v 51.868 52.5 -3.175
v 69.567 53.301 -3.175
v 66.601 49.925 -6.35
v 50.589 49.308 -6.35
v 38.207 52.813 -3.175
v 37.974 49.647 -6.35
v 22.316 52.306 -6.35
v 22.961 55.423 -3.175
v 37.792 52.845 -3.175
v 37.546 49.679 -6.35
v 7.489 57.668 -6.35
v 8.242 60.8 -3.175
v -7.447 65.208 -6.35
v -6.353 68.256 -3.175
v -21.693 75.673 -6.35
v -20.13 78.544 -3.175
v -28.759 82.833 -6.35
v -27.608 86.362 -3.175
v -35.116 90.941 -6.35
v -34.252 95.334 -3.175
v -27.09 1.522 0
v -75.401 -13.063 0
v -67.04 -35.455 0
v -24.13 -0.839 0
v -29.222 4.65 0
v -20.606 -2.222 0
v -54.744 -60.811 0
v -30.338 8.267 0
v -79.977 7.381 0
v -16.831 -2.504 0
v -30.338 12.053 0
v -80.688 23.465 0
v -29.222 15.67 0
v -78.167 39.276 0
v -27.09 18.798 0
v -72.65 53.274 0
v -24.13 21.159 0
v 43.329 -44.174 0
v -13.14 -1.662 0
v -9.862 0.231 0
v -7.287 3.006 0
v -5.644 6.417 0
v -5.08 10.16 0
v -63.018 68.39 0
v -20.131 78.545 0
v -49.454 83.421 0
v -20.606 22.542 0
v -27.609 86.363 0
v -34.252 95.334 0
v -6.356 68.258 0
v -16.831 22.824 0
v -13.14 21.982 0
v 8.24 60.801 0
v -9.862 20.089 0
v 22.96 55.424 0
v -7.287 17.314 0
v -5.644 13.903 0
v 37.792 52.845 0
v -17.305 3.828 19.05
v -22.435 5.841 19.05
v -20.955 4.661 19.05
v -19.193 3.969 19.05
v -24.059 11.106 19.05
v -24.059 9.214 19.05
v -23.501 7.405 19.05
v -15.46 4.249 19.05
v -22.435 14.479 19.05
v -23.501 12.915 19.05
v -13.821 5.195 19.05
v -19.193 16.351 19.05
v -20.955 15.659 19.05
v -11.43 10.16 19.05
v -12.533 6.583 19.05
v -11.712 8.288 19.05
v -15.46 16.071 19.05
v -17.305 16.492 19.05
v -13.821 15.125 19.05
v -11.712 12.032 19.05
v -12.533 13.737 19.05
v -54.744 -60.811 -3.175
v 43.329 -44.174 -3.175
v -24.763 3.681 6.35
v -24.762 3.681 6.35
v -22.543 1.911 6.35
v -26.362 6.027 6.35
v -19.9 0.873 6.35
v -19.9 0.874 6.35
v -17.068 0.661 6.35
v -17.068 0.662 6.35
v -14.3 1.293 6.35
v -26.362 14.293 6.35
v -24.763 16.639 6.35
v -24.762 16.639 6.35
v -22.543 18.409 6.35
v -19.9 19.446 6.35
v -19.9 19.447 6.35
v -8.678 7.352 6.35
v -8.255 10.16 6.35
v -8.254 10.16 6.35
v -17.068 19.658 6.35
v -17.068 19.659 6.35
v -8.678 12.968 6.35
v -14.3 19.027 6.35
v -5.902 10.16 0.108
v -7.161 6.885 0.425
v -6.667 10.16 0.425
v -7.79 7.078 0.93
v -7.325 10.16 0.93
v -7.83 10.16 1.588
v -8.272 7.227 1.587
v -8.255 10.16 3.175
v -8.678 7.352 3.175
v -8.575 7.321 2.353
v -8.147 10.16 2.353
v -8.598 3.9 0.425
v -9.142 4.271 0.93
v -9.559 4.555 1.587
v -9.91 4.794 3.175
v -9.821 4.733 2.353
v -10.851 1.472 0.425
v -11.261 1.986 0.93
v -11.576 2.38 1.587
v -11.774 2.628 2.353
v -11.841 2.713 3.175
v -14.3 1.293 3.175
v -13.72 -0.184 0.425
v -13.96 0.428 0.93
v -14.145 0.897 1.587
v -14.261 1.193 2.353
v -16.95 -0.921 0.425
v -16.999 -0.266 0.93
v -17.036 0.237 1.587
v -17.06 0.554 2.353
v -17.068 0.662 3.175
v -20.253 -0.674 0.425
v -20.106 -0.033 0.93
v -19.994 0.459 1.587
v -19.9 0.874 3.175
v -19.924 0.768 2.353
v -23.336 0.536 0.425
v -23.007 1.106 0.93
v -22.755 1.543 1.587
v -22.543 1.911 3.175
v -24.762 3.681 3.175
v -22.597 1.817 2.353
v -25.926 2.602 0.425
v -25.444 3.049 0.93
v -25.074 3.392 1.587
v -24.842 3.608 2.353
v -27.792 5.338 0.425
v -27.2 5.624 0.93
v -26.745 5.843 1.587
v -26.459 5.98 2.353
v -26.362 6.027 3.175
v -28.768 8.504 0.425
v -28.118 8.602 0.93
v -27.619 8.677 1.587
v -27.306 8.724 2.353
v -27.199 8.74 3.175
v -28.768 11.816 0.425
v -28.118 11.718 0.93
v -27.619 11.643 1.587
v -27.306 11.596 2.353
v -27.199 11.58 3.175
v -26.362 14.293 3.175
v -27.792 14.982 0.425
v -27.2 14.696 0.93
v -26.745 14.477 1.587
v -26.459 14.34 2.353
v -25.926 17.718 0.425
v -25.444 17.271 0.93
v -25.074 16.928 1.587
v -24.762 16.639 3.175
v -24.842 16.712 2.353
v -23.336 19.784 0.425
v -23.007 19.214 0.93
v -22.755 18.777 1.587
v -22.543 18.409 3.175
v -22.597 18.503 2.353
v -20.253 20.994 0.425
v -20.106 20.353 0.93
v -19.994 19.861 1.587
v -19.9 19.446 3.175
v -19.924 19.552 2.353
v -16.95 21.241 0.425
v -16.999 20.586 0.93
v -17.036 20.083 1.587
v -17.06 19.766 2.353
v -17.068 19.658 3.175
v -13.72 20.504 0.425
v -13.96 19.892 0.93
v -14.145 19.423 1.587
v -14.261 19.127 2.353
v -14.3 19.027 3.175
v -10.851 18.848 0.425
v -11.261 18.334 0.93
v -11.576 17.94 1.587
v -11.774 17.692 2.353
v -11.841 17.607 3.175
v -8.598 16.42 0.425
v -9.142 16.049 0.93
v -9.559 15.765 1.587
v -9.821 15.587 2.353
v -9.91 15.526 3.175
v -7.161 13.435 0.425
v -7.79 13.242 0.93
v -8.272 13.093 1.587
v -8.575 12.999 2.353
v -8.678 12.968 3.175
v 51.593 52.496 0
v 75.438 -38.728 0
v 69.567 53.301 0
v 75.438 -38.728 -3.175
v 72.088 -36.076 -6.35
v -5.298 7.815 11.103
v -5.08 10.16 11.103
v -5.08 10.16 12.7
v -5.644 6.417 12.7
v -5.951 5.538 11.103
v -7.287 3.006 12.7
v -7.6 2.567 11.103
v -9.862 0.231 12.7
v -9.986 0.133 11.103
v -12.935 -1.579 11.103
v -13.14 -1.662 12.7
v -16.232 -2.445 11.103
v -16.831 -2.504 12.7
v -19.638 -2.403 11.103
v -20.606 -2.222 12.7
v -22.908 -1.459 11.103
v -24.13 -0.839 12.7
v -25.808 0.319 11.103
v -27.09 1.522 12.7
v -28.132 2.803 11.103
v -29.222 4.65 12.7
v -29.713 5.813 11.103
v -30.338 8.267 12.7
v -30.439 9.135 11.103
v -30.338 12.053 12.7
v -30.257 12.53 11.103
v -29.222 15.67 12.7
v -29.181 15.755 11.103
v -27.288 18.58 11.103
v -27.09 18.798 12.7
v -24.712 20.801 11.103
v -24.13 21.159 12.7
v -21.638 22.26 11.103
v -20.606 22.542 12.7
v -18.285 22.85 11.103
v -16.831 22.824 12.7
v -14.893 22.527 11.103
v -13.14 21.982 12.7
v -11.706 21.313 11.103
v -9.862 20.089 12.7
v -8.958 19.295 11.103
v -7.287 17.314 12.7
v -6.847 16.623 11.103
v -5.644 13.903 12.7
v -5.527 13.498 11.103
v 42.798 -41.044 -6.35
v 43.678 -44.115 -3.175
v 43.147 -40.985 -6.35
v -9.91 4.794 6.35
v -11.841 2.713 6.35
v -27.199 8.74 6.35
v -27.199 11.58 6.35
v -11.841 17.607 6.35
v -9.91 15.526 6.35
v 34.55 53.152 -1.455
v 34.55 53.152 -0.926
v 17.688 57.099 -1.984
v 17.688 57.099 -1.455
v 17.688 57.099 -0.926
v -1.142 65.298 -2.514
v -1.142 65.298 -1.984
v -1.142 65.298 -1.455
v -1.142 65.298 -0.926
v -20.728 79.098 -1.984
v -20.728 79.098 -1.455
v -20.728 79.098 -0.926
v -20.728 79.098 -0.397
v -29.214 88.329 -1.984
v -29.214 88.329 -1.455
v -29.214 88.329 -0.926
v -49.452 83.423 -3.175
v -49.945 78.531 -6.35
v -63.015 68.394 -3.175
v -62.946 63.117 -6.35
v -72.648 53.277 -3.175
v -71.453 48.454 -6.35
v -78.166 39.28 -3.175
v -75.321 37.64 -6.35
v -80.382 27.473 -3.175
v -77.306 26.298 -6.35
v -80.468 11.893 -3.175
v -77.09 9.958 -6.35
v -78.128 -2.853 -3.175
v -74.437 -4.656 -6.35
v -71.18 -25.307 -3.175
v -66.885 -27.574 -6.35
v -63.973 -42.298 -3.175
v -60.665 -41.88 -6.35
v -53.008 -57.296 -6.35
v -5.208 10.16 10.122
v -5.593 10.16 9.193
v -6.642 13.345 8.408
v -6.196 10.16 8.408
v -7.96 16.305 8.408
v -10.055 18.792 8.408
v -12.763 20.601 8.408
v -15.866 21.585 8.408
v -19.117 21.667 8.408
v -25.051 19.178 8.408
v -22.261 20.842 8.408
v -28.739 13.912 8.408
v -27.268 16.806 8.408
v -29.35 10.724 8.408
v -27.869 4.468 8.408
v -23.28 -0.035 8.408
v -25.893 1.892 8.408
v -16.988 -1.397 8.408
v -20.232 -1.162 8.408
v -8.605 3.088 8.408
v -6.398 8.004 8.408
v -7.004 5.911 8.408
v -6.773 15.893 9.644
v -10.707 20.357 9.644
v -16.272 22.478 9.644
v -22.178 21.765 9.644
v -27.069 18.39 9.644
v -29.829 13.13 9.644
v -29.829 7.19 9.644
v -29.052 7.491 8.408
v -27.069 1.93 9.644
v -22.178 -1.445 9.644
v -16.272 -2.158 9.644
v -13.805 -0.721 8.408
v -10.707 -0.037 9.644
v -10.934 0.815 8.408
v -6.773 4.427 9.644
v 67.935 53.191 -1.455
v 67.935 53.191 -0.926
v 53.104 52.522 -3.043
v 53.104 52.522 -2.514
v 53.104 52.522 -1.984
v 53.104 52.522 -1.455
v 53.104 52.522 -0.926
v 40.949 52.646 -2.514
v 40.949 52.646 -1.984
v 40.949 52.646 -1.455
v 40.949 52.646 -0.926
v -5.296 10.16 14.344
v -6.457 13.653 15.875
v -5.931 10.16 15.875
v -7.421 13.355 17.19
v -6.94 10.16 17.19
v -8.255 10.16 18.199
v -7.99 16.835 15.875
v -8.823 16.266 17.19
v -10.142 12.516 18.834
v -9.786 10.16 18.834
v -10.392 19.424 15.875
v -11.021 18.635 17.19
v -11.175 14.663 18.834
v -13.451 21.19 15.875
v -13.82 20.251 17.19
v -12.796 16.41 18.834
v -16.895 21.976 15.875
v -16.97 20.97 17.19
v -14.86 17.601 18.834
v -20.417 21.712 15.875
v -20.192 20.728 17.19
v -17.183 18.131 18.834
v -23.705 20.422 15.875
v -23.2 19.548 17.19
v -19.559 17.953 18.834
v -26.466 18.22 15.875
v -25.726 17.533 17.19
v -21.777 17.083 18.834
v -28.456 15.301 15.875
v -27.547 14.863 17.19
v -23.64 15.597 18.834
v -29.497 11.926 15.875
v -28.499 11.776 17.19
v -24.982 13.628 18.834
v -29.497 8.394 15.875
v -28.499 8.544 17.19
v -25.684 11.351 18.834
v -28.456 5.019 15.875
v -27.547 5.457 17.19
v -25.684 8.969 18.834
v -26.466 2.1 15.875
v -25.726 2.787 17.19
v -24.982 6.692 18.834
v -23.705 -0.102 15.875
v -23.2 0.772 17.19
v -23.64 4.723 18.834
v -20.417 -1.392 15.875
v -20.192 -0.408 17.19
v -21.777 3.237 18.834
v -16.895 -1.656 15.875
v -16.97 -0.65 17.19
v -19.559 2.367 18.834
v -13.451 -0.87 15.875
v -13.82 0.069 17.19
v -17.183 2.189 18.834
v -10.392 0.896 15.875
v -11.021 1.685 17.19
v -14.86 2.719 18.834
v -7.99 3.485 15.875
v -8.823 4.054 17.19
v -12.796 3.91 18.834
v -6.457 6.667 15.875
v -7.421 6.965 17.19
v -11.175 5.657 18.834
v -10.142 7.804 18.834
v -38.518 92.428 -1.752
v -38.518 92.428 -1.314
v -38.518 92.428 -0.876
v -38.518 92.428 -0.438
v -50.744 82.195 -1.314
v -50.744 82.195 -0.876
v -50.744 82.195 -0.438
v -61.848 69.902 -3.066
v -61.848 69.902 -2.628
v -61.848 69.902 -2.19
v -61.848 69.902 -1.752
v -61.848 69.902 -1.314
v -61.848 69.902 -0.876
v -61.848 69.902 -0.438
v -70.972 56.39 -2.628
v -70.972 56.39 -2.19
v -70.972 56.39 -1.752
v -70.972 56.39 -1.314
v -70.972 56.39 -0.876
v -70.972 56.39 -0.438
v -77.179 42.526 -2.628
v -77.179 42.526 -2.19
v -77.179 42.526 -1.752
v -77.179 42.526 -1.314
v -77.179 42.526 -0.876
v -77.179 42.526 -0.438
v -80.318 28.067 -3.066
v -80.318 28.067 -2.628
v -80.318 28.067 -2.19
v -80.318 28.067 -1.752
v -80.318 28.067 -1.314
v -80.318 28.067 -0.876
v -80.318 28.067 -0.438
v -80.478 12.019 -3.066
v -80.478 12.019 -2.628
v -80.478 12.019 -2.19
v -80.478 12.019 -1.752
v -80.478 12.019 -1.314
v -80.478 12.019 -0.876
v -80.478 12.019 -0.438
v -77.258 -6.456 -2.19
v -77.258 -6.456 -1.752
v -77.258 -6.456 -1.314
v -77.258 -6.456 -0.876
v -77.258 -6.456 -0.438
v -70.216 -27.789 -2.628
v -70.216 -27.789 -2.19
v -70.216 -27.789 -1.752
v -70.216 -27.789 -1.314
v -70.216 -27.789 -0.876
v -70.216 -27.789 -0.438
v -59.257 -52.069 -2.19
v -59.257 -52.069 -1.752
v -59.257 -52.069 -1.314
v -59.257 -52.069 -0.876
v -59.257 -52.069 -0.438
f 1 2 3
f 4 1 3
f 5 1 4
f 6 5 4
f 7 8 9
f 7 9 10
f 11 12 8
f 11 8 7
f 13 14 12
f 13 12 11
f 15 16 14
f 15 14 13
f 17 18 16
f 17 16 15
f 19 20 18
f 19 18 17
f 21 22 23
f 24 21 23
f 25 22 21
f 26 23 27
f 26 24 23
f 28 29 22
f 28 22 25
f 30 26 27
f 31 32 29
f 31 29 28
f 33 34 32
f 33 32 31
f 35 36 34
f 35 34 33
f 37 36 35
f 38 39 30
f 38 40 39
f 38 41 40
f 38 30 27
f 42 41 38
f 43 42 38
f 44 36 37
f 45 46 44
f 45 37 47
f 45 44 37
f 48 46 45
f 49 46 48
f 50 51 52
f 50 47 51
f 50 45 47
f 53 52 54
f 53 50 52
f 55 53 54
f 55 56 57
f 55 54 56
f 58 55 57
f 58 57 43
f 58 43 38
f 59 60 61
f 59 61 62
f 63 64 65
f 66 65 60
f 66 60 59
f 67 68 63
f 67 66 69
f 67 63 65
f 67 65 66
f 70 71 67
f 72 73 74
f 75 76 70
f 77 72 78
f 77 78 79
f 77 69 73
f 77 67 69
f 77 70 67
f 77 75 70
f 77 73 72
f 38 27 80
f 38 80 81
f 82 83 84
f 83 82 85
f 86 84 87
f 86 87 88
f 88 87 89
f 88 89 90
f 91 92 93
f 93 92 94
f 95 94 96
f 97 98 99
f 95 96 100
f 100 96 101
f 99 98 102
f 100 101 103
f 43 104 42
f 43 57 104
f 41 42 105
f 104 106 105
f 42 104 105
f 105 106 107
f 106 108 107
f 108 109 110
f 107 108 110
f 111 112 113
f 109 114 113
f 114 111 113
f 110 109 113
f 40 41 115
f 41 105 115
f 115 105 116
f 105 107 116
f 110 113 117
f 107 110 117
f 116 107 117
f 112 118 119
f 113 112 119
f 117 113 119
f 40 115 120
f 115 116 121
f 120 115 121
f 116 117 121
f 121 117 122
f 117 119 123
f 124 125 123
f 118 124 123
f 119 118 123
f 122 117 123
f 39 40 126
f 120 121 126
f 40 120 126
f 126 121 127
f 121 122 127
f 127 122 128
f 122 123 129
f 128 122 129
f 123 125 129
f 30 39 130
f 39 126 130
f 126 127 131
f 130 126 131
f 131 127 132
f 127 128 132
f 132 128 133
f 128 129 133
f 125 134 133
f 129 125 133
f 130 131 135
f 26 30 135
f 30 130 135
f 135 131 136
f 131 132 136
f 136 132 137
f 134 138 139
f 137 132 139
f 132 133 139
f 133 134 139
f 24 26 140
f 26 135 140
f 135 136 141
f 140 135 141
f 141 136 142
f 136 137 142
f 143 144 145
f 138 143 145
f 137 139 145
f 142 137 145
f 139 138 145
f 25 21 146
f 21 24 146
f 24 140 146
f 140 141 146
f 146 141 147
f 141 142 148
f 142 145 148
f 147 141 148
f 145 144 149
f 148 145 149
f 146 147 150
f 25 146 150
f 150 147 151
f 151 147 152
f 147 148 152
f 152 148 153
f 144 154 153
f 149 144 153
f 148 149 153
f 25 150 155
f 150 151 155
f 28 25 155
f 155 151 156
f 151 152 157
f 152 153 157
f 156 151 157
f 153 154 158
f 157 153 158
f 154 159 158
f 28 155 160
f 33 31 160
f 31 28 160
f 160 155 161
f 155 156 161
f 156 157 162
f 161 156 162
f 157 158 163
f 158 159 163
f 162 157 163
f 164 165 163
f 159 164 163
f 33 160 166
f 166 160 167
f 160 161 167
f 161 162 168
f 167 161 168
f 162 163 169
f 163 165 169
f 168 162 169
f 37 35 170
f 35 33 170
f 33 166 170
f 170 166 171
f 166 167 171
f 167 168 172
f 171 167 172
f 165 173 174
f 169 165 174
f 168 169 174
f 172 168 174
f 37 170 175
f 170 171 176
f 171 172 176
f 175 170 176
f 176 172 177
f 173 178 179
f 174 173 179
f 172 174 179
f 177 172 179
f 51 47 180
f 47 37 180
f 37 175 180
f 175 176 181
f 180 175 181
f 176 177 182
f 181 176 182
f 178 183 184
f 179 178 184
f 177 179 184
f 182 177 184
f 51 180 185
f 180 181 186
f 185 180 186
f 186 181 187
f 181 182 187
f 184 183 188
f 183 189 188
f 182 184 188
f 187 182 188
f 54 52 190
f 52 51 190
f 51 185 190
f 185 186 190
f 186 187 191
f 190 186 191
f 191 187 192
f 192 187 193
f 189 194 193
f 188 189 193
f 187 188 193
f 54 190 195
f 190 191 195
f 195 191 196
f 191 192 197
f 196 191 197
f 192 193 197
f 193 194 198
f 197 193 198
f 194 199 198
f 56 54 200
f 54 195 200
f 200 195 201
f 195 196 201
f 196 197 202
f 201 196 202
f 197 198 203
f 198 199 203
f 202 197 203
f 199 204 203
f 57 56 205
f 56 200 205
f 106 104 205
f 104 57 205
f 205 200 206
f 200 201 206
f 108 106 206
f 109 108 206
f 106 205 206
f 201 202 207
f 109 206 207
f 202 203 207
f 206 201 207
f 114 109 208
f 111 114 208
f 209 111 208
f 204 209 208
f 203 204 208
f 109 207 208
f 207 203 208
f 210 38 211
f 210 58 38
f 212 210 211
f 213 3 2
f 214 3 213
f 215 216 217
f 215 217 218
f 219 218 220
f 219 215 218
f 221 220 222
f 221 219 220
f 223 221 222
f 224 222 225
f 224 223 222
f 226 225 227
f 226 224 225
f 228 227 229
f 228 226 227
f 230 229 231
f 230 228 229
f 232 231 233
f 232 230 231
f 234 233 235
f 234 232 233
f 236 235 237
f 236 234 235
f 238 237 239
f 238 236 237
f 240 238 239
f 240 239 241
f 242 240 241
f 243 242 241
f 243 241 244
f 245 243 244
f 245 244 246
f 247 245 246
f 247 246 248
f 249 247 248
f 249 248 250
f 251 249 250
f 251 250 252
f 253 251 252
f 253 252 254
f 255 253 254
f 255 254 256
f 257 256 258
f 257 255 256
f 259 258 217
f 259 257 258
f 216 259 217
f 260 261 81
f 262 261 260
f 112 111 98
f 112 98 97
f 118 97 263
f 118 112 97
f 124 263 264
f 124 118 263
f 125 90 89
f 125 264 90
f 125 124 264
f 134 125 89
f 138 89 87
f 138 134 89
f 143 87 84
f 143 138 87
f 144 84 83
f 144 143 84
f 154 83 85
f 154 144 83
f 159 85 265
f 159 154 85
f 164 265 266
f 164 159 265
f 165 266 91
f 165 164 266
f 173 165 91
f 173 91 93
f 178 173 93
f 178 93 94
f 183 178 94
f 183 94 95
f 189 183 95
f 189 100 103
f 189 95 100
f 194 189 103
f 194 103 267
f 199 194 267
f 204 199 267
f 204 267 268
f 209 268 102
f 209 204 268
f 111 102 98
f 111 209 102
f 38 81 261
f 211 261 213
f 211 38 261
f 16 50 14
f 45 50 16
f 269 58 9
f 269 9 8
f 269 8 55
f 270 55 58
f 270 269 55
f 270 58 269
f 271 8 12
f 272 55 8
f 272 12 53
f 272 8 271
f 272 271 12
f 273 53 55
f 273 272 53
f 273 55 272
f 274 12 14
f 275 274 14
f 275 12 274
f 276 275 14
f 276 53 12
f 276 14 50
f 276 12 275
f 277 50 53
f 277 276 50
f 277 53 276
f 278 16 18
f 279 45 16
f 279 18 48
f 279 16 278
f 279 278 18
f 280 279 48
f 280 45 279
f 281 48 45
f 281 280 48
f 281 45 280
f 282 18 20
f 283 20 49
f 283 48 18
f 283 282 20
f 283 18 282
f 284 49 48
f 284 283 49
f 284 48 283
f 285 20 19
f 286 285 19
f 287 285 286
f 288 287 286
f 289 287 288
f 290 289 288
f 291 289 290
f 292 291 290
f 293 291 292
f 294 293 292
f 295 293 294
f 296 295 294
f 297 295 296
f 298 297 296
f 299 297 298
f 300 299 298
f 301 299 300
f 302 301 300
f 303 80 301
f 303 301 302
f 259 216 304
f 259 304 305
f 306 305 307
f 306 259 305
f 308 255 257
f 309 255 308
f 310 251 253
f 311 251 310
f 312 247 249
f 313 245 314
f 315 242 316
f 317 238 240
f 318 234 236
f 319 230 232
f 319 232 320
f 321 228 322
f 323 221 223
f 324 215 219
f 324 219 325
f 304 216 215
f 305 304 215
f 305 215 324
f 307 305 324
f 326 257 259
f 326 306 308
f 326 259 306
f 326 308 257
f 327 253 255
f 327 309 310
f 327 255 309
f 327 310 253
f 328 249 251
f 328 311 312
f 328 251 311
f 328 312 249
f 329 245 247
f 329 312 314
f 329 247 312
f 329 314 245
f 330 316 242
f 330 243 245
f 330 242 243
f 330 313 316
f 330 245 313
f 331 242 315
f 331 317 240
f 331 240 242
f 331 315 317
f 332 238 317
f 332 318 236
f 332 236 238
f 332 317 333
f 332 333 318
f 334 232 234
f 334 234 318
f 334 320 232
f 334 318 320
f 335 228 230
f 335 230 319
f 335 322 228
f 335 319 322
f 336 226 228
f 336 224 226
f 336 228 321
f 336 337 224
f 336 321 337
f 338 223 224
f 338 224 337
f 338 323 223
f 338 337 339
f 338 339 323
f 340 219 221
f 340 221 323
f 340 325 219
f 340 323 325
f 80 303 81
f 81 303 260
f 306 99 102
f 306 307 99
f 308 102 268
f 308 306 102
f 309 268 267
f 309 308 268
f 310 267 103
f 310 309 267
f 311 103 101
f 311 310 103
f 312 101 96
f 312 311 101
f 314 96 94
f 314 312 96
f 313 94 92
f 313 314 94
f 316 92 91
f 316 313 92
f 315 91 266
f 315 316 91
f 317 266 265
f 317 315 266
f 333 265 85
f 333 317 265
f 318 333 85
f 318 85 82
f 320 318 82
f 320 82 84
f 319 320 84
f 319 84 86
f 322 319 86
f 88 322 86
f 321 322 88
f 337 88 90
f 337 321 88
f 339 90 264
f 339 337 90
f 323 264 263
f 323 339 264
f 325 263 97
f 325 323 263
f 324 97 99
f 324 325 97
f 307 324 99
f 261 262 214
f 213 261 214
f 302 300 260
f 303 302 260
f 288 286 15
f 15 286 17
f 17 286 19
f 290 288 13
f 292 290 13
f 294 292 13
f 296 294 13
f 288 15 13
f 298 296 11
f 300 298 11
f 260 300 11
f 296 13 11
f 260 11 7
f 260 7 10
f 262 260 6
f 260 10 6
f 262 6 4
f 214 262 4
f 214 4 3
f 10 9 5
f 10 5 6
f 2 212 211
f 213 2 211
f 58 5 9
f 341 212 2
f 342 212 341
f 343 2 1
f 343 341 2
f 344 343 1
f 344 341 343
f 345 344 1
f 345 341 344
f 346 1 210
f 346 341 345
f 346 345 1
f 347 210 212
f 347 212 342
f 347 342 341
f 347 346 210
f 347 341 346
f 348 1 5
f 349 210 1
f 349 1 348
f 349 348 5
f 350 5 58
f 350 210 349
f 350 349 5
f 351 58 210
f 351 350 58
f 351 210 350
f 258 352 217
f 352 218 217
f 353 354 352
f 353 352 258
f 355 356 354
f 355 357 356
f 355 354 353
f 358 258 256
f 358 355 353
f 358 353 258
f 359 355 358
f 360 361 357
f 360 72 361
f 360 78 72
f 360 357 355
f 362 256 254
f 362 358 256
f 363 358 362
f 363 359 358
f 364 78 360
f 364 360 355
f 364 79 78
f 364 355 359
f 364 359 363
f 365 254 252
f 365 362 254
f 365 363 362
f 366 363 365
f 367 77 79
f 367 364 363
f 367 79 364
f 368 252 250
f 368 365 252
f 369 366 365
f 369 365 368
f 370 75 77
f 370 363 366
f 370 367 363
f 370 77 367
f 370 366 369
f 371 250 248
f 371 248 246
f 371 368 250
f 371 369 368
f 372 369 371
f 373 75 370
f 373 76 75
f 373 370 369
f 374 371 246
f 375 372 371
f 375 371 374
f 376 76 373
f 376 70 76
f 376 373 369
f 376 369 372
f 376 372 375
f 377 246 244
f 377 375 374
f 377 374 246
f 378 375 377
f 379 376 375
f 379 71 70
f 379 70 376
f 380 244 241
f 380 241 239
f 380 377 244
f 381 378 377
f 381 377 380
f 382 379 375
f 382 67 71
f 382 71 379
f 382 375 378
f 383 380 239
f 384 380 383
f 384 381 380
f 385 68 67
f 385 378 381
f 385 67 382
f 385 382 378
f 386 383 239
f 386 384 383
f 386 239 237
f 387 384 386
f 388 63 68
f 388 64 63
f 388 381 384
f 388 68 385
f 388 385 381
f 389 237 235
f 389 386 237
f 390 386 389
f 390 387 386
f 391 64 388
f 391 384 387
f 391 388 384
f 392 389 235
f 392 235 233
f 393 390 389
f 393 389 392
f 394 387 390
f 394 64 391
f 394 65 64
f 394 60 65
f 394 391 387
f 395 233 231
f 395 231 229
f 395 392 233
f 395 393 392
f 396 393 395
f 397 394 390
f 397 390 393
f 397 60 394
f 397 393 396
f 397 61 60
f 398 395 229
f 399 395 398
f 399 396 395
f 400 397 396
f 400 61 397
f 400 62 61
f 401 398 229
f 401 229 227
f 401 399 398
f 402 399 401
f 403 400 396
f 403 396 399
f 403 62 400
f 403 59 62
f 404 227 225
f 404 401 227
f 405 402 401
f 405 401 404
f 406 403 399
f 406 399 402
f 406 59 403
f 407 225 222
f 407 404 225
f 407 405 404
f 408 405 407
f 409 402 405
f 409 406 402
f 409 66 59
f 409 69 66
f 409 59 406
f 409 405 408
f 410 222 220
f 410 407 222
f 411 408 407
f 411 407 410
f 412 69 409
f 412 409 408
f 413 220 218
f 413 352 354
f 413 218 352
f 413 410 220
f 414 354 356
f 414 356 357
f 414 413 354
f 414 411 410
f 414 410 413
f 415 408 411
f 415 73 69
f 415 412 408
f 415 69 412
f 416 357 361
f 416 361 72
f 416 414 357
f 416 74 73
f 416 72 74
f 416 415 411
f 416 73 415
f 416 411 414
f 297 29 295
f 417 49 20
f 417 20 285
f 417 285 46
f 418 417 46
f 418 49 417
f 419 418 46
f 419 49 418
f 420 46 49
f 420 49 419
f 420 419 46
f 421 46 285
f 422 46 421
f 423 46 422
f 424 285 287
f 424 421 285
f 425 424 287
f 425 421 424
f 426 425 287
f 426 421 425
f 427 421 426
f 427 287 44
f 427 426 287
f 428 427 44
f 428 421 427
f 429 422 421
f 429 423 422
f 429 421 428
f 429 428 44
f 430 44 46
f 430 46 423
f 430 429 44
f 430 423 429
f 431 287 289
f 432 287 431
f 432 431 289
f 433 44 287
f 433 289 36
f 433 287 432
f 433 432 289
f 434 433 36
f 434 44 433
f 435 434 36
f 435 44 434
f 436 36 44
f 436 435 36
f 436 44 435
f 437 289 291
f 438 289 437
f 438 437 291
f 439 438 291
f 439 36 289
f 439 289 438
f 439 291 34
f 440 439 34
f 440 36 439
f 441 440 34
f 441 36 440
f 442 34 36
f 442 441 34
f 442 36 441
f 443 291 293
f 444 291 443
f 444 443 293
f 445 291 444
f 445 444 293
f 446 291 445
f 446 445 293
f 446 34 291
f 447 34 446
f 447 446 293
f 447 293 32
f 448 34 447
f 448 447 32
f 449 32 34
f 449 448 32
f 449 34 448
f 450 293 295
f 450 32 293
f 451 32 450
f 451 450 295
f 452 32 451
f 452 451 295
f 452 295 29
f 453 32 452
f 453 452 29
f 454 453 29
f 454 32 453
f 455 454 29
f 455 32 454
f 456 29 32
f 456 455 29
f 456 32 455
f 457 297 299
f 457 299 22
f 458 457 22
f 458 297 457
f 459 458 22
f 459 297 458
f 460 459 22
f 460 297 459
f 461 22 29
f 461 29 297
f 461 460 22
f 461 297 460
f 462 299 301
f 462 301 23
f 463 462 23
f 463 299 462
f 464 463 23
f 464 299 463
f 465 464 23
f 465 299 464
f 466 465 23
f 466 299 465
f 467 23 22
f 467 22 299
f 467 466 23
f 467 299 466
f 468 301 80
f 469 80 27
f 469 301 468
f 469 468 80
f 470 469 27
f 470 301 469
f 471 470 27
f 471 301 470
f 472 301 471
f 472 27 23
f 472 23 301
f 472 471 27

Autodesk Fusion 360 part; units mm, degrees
sketch "MaskV2" plane through (0, 0, 0) normal (0, 0, 1) x (1, 0, 0)
  spline S0 degree 5 poles (-34.2523, 95.3336) (-35.2526, 94.6891) (-37.2409, 93.3658) (-40.1864, 91.2783) (-44.0399, 88.2891) (-48.7276, 84.2113) (-53.2705, 79.8034) (-57.6389, 75.091) (-61.7831, 70.123) (-65.6362, 64.9683) (-69.1279, 59.6986) (-72.1952, 54.3745) (-74.7946, 49.0314) (-76.9151, 43.6626) (-78.5689, 38.2286) (-79.7757, 32.67) (-80.5515, 26.9191) (-80.8926, 20.9126) (-80.7756, 14.597) (-80.1673, 7.9268) (-79.031, 0.8656) (-77.3347, -6.6132) (-75.0591, -14.5257) (-72.1957, -22.8797) (-68.7429, -31.6769) (-64.7038, -40.9156) (-61.0077, -48.6568) (-57.9762, -54.6582) (-55.8403, -58.7457) (-54.7436, -60.8111) knots 0 0 0 0 0 0 0.04 0.08 0.12 0.16 0.2 0.24 0.28 0.32 0.36 0.4 0.44 0.48 0.52 0.56 0.6 0.64 0.68 0.72 0.76 0.8 0.84 0.88 0.92 0.96 1 1 1 1 1 1
  spline S1 degree 5 poles (69.5672, 53.3007) (67.8702, 53.1838) (64.548, 52.9705) (59.7802, 52.7121) (53.8562, 52.4908) (47.173, 52.4234) (41.1946, 52.571) (35.8717, 52.9412) (31.1095, 53.5427) (26.7456, 54.3847) (22.5564, 55.477) (18.3169, 56.8318) (13.8423, 58.4658) (9.0491, 60.4018) (3.9674, 62.668) (-1.3048, 65.2946) (-6.6318, 68.31) (-11.8738, 71.7374) (-16.9248, 75.5895) (-21.7215, 79.8688) (-26.2284, 84.5726) (-29.5909, 88.6705) (-31.975, 91.93) (-33.5034, 94.1853) (-34.2523, 95.3336) knots 0 0 0 0 0 0 0.05 0.1 0.15 0.2 0.25 0.3 0.35 0.4 0.45 0.5 0.55 0.6 0.65 0.7 0.75 0.8 0.85 0.9 0.95 1 1 1 1 1 1
  line L0 (37.7916, 52.8446) -> (43.3291, -44.1745)
  line L1 (-54.7436, -60.8111) -> (75.4385, -38.7276)
  line L2 (69.5672, 53.3007) -> (75.4385, -38.7276)
  circle A0 centre (-17.78, 10.16) radius 9.525
  circle A1 centre (-17.78, 10.16) radius 12.7
  line L3 (-33.8654, -49.2972) -> (47.6075, -34.9313) construction
  line L4 (47.6075, -34.9313) -> (44.2995, -16.1707) construction
  line L5 (44.2995, -16.1707) -> (-37.1734, -30.5366) construction
  line L6 (-37.1734, -30.5366) -> (-33.8654, -49.2972) construction
  dimension "d1" = 19.05
  dimension "d2" = 25.4
extrude "Extrude1" add sketch "MaskV2" against normal blind 6.35 contours S0 S1 L0 L1 | A0 | A1
extrude "Extrude2" add sketch "MaskV2" along normal blind 19.05 contours A0
extrude "Extrude3" add sketch "MaskV2" along normal blind 12.7 from surface at 6.35 contours A1
extrude "Extrude4" add sketch "MaskV2" against normal blind 6.35 contours S1 L0 L1 L2
fillet "Fillet1" radius 6.35 1 edges at (-29.6206, 5.5675, 19.05)
chamfer "Chamfer1" distance 3.175 angle 45 1 edges at (-29.6206, 5.5675, 6.35)
fillet "Fillet2" radius 3.81 1 edges at (-29.6206, 14.7525, 9.525)
chamfer "Chamfer2" distance 3.175 angle 45 6 edges at (-5.7072, -52.4928, -6.35) (-79.1174, 35.4295, -6.35) (2.2203, 63.5787, -6.35) (10.3475, -49.7693, -6.35) (72.5028, 7.2866, -6.35) (51.77, 52.4982, -6.35)
fillet "Fillet3" radius 3.175 1 edges at (-26.6604, 13.6044, 0)
